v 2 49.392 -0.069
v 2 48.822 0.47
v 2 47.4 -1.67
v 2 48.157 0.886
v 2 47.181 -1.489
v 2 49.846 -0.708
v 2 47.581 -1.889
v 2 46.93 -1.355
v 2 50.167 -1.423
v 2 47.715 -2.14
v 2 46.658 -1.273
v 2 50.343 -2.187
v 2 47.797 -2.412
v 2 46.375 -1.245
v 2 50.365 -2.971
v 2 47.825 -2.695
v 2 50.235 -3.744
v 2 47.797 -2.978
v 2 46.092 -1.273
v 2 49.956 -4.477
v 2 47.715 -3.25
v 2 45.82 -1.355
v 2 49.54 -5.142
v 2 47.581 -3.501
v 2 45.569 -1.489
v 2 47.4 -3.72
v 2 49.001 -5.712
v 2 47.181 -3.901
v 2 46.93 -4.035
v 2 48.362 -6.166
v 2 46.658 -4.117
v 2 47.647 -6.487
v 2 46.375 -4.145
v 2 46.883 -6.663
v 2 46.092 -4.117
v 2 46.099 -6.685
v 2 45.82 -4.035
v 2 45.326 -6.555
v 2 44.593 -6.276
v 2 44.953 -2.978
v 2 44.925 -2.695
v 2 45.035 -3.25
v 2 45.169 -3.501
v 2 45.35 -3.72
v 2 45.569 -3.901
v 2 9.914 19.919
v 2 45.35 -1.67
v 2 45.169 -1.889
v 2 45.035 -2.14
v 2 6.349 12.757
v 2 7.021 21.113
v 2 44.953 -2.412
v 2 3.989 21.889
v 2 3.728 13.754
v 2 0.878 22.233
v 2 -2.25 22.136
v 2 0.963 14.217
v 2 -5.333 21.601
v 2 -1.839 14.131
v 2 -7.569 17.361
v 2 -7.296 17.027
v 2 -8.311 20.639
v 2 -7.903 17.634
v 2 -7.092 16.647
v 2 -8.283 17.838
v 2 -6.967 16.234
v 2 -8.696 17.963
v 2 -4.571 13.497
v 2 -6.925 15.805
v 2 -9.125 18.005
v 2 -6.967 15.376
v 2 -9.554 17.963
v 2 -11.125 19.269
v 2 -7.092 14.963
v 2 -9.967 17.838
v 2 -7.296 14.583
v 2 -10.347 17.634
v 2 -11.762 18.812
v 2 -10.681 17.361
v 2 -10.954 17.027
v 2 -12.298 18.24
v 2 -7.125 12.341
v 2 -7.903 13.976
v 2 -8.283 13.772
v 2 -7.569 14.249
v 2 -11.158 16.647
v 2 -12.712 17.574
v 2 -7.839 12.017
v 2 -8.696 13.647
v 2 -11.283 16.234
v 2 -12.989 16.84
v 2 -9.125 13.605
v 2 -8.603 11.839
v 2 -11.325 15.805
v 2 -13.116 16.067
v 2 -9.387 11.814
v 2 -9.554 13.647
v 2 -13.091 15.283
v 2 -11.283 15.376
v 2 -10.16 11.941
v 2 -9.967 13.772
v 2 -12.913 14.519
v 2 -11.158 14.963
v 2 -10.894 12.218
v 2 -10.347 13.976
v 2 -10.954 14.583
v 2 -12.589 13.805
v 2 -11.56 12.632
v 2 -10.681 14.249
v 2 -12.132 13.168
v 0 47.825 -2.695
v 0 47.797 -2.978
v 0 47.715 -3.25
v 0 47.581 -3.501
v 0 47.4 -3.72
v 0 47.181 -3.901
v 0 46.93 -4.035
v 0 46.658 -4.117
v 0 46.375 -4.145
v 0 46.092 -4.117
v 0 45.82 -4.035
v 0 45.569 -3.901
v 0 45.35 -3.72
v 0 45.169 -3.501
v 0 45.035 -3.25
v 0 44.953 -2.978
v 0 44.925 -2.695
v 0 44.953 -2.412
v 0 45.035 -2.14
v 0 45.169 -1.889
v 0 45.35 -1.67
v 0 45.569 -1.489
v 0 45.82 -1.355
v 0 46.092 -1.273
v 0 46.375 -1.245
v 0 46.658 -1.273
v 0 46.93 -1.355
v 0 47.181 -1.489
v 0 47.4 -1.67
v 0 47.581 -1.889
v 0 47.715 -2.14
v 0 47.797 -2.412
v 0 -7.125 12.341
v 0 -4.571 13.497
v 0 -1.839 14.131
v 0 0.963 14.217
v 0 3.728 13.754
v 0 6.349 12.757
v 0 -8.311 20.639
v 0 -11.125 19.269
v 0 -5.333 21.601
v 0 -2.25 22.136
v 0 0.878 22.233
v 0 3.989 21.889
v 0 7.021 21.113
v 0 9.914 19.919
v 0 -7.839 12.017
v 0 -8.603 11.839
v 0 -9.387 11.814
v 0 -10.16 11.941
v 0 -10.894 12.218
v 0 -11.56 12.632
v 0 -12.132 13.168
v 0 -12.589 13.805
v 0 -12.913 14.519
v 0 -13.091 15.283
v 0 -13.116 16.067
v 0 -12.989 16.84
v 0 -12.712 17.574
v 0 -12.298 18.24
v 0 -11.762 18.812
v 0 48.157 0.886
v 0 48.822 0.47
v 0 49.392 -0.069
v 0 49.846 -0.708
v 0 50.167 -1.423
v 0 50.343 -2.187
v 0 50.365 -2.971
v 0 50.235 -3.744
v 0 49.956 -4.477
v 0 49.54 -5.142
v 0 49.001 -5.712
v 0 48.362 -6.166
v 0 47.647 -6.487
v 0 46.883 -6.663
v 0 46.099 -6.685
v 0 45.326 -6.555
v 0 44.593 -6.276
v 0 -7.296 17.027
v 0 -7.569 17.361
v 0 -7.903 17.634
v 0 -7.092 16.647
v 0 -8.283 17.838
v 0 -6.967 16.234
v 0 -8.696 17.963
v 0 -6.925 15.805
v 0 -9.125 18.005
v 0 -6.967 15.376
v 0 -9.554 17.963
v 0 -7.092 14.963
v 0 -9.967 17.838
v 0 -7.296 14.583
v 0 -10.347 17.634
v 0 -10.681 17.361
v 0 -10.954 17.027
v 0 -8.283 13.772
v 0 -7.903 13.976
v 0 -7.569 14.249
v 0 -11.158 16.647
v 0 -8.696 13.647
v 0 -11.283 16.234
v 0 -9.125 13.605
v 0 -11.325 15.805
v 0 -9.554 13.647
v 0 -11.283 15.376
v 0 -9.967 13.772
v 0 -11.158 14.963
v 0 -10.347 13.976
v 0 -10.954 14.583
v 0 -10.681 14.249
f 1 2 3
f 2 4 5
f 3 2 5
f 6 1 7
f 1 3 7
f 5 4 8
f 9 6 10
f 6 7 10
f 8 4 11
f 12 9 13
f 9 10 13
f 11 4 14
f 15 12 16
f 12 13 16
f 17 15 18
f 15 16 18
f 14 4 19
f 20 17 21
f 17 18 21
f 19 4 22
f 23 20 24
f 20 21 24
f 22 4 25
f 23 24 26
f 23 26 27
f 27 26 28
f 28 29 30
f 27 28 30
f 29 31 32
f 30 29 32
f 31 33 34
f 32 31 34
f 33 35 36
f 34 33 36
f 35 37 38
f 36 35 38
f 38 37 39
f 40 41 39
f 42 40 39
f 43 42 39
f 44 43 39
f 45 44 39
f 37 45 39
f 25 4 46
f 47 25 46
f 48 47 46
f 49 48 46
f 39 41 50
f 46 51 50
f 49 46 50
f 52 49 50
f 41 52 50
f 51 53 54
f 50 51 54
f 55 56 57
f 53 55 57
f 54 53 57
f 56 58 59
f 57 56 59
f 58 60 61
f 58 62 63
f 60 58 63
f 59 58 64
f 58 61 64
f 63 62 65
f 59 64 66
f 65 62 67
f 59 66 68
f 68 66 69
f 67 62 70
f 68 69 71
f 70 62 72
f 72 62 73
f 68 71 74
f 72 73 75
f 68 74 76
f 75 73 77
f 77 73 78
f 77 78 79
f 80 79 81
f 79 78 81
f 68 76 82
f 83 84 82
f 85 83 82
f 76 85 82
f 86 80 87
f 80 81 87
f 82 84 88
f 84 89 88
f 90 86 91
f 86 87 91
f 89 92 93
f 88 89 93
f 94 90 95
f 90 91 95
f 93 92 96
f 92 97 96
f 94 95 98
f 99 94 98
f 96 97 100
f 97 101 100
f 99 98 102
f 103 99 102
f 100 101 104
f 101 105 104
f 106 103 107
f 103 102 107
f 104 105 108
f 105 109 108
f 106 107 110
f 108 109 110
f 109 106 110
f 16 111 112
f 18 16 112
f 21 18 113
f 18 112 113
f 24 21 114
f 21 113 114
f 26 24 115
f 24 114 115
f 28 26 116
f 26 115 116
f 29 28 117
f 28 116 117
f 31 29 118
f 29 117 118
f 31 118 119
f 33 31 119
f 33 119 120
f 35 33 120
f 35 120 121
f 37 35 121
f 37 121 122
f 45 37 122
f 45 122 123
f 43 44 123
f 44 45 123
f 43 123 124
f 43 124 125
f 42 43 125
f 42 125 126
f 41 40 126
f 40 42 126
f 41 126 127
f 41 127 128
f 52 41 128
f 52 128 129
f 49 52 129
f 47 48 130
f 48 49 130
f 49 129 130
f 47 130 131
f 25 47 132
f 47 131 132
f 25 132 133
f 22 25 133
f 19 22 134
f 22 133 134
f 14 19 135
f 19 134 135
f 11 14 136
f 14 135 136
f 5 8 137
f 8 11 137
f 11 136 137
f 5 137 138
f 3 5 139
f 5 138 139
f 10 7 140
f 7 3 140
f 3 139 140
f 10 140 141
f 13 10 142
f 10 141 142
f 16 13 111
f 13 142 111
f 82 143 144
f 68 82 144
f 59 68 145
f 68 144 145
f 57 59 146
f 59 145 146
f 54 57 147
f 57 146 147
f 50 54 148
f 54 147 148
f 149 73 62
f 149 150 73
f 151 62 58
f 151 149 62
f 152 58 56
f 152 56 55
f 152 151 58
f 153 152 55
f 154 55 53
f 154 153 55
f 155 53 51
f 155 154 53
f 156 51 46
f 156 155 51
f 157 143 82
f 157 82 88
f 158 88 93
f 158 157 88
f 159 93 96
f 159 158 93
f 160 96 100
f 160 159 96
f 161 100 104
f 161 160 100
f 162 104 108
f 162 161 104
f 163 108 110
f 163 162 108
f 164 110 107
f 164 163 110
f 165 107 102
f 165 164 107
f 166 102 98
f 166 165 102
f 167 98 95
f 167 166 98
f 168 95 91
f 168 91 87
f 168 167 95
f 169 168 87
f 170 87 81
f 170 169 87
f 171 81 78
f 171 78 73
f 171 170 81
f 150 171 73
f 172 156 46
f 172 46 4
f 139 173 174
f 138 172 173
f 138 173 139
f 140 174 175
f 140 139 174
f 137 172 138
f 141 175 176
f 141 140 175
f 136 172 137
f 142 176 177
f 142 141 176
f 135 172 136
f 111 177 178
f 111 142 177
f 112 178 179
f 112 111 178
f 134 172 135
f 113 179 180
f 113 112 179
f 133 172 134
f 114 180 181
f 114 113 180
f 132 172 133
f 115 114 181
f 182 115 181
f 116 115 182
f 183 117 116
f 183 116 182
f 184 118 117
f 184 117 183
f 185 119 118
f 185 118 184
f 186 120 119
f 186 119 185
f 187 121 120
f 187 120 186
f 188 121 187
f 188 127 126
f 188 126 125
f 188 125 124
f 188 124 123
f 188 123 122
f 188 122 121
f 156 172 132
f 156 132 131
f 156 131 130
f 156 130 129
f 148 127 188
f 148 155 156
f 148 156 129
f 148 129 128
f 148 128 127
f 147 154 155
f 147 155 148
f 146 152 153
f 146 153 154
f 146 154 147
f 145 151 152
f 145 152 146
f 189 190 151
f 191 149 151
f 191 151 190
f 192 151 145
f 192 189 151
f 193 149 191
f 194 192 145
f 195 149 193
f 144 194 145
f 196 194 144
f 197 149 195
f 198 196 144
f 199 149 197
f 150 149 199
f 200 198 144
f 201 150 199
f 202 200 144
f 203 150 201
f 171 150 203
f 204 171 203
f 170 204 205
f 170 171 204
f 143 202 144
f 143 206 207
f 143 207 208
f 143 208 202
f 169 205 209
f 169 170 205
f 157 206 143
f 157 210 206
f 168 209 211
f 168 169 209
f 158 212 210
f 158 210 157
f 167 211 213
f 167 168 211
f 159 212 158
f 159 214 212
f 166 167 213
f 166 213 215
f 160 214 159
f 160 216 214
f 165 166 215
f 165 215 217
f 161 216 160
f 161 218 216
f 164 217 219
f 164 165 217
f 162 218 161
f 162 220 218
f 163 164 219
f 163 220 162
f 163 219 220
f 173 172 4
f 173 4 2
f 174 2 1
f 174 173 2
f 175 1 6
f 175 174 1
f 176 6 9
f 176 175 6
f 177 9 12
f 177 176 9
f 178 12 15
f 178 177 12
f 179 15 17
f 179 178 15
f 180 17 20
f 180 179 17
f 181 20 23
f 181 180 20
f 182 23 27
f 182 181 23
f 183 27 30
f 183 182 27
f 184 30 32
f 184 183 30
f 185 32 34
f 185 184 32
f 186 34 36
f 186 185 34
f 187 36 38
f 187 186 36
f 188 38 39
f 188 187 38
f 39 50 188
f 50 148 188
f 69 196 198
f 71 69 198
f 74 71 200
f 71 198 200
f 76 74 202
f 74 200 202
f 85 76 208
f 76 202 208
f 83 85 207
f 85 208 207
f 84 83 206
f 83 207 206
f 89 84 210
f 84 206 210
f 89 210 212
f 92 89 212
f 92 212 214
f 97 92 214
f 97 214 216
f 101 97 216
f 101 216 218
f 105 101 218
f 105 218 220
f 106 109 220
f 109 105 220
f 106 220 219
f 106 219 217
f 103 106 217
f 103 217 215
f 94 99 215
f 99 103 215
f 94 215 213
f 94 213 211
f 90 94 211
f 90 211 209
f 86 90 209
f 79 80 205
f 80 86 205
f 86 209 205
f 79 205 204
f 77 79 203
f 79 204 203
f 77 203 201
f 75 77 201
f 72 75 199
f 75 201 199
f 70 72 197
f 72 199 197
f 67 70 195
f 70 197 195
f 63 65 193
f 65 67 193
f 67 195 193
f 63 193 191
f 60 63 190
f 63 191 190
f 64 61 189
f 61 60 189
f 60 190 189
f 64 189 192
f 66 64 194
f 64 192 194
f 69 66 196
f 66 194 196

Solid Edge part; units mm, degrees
sketch "Sketch1" plane through (0, 0, 0) normal (1, 0, 0) x (0, 1, 0)
  line L0 (9.9137, 19.9194) -> (48.1572, 0.886)
  arc A0 (48.1572, 0.886) -> (44.5928, -6.276) centre (46.375, -2.695) cw
  line L1 (6.3492, 12.7574) -> (44.5928, -6.276)
  arc A1 (-7.125, 12.3409) -> (6.3492, 12.7574) centre (0, 0) cw
  arc A2 (-7.125, 12.3409) -> (-11.125, 19.2691) centre (-9.125, 15.805) cw
  arc A3 (-11.125, 19.2691) -> (9.9137, 19.9194) centre (0, 0) cw
  circle A4 centre (46.375, -2.695) radius 1.45
  circle A5 centre (-9.125, 15.805) radius 2.2
  dimension "D1" = 4
  dimension "D2" = 4.4
  dimension "D3" = 2.9
extrude "Protrusion1" add sketch "Sketch1" along normal blind 2
